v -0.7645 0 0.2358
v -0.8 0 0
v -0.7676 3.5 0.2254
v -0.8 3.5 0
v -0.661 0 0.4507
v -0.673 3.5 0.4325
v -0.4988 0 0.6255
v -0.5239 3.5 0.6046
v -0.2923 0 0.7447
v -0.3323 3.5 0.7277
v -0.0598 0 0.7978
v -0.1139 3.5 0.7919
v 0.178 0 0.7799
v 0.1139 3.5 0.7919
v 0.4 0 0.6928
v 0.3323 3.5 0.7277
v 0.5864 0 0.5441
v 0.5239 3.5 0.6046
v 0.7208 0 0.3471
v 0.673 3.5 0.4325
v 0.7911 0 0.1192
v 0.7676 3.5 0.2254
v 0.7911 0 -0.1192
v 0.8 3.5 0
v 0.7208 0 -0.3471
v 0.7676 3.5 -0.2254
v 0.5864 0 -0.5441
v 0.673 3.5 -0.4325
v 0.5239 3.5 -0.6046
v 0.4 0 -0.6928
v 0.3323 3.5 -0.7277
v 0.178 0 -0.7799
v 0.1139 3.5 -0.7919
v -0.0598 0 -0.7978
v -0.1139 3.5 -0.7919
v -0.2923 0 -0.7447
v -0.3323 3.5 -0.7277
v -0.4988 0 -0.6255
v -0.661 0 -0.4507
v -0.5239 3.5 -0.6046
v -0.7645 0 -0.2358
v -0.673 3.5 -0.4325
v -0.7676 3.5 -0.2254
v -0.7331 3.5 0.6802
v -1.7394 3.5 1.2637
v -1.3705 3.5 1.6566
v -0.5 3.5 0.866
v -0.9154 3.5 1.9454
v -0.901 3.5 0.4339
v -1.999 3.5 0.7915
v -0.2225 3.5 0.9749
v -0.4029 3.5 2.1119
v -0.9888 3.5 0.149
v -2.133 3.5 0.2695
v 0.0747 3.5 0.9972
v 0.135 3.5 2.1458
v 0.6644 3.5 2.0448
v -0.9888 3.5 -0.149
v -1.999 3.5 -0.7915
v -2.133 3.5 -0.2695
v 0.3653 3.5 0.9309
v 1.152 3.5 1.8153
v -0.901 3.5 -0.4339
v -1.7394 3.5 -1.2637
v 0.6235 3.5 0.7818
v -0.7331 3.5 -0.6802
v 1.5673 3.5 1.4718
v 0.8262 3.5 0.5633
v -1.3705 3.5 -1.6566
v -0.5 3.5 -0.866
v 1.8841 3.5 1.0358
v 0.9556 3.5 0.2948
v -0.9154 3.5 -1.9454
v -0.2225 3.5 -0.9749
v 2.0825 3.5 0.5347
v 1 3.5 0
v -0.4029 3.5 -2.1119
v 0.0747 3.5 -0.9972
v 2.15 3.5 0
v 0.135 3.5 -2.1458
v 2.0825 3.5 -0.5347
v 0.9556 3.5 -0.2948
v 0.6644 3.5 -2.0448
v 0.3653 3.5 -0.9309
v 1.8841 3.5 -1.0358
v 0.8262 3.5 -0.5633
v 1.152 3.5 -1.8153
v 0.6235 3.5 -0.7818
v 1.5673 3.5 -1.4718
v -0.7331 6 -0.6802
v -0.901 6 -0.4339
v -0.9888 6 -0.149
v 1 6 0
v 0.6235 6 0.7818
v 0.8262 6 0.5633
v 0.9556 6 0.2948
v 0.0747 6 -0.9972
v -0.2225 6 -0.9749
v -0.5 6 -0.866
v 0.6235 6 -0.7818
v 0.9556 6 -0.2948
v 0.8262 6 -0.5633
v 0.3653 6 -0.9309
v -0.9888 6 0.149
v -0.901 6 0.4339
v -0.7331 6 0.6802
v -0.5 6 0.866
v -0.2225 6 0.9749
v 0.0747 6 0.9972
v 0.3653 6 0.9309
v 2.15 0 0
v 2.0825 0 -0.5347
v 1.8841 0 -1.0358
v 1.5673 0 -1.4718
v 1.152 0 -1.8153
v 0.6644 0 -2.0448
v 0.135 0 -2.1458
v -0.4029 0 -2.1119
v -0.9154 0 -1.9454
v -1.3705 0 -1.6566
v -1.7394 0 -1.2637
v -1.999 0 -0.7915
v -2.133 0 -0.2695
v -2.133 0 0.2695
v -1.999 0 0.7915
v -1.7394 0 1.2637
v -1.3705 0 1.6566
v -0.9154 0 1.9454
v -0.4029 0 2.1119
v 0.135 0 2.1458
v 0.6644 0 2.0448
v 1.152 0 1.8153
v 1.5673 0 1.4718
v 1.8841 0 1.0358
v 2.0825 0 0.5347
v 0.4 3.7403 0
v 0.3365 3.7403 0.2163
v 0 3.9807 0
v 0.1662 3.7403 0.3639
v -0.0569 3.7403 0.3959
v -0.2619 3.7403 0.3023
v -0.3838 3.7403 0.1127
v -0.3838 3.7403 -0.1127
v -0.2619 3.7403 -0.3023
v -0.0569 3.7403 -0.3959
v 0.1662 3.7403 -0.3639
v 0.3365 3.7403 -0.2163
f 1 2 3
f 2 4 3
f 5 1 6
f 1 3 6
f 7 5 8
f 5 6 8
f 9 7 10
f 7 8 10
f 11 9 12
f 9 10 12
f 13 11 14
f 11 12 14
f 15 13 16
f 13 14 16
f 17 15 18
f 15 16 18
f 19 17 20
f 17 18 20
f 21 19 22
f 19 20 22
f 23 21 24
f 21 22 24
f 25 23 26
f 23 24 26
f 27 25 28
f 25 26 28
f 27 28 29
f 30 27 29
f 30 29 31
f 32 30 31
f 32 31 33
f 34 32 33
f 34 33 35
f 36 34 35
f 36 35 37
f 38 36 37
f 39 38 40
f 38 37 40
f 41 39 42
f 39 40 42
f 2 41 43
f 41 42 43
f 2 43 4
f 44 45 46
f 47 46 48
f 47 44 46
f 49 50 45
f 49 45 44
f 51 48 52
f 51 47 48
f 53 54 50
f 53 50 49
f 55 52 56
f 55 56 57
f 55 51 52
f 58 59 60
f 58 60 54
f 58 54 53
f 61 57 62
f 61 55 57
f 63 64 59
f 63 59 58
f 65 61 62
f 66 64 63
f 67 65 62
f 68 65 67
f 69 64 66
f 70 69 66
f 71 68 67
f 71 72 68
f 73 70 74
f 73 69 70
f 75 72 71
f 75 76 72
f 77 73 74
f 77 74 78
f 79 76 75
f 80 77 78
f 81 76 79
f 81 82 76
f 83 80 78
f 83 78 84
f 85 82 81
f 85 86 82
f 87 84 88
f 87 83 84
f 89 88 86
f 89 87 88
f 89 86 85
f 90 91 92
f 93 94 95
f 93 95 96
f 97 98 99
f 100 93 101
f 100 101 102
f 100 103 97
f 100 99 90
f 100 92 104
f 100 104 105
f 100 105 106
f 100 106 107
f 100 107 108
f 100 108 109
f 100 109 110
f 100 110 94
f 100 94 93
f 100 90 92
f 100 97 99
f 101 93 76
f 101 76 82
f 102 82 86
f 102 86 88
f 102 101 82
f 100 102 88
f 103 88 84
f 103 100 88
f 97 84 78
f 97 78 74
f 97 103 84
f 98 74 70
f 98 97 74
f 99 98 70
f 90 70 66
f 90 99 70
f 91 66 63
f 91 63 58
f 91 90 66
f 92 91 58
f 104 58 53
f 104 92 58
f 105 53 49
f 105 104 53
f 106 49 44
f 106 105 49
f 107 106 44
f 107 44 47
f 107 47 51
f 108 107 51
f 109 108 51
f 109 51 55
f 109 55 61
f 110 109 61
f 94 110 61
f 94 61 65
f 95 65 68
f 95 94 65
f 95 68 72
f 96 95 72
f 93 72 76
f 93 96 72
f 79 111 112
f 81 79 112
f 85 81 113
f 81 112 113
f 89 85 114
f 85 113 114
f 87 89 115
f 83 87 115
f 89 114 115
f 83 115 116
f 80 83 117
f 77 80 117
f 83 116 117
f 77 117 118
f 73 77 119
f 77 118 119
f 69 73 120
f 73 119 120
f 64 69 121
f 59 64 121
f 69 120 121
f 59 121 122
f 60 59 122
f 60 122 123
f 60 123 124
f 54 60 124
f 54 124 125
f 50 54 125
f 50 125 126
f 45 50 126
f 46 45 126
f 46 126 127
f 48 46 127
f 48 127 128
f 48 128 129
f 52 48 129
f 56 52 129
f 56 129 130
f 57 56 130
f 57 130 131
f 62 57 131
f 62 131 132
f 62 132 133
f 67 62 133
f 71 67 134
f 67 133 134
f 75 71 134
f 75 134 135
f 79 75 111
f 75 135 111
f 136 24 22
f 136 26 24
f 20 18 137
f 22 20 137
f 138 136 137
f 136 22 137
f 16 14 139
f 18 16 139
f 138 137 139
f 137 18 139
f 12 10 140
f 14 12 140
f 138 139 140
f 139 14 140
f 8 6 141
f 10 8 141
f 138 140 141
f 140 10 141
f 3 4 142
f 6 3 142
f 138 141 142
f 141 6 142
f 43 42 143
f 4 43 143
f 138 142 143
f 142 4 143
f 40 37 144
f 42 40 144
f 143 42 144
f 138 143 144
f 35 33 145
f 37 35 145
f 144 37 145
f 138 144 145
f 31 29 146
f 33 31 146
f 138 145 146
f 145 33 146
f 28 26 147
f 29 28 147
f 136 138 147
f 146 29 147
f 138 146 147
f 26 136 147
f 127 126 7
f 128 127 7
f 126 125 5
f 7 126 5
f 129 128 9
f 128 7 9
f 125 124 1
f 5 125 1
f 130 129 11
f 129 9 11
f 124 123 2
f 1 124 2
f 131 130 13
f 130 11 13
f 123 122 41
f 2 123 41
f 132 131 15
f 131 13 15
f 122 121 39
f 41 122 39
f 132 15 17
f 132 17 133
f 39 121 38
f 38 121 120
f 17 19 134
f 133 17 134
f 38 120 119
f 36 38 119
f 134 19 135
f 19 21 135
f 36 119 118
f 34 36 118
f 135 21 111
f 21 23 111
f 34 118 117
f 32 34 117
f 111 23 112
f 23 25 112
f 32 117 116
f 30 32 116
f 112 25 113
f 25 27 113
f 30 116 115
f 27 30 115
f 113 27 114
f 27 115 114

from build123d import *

# Parameters (mm, degrees)
SKETCH1_R                 = 2.15
BOSS_EXTRUDE1_DEPTH       = 6
SKETCH2_R                 = 2.15
SKETCH2_R_2               = 1
CUT_EXTRUDE1_DEPTH        = 2.5
M2X0_4_TAPPED_HOLE1_D     = 1.6
M2X0_4_TAPPED_HOLE1_DEPTH = 3.5
M2X0_4_TAPPED_HOLE1_TIP   = 0.480688495


with BuildPart() as part:
    # Sketch1 → Boss-Extrude1 (new body)
    with BuildSketch(Plane(origin=(0, 0, 0), x_dir=(1, 0, 0), z_dir=(0, 1, 0))):
        Circle(SKETCH1_R)
    extrude(amount=BOSS_EXTRUDE1_DEPTH)

    # Sketch2 → Cut-Extrude1 (cut)
    with BuildSketch(Plane(origin=(0, 6, 0), x_dir=(1, 0, 0), z_dir=(0, 1, 0))):
        Circle(SKETCH2_R)
        Circle(SKETCH2_R_2, mode=Mode.SUBTRACT)
    extrude(amount=-CUT_EXTRUDE1_DEPTH, mode=Mode.SUBTRACT)

    # M2x0.4 Tapped Hole1
    with Locations(Plane.XZ):
        with Locations((0, 0)):
            Hole(M2X0_4_TAPPED_HOLE1_D / 2, depth=M2X0_4_TAPPED_HOLE1_DEPTH)
            with Locations((0, 0, -(M2X0_4_TAPPED_HOLE1_DEPTH + M2X0_4_TAPPED_HOLE1_TIP / 2))):  # 118° drill point
                Cone(0, M2X0_4_TAPPED_HOLE1_D / 2, M2X0_4_TAPPED_HOLE1_TIP, mode=Mode.SUBTRACT)


solid = part.part
